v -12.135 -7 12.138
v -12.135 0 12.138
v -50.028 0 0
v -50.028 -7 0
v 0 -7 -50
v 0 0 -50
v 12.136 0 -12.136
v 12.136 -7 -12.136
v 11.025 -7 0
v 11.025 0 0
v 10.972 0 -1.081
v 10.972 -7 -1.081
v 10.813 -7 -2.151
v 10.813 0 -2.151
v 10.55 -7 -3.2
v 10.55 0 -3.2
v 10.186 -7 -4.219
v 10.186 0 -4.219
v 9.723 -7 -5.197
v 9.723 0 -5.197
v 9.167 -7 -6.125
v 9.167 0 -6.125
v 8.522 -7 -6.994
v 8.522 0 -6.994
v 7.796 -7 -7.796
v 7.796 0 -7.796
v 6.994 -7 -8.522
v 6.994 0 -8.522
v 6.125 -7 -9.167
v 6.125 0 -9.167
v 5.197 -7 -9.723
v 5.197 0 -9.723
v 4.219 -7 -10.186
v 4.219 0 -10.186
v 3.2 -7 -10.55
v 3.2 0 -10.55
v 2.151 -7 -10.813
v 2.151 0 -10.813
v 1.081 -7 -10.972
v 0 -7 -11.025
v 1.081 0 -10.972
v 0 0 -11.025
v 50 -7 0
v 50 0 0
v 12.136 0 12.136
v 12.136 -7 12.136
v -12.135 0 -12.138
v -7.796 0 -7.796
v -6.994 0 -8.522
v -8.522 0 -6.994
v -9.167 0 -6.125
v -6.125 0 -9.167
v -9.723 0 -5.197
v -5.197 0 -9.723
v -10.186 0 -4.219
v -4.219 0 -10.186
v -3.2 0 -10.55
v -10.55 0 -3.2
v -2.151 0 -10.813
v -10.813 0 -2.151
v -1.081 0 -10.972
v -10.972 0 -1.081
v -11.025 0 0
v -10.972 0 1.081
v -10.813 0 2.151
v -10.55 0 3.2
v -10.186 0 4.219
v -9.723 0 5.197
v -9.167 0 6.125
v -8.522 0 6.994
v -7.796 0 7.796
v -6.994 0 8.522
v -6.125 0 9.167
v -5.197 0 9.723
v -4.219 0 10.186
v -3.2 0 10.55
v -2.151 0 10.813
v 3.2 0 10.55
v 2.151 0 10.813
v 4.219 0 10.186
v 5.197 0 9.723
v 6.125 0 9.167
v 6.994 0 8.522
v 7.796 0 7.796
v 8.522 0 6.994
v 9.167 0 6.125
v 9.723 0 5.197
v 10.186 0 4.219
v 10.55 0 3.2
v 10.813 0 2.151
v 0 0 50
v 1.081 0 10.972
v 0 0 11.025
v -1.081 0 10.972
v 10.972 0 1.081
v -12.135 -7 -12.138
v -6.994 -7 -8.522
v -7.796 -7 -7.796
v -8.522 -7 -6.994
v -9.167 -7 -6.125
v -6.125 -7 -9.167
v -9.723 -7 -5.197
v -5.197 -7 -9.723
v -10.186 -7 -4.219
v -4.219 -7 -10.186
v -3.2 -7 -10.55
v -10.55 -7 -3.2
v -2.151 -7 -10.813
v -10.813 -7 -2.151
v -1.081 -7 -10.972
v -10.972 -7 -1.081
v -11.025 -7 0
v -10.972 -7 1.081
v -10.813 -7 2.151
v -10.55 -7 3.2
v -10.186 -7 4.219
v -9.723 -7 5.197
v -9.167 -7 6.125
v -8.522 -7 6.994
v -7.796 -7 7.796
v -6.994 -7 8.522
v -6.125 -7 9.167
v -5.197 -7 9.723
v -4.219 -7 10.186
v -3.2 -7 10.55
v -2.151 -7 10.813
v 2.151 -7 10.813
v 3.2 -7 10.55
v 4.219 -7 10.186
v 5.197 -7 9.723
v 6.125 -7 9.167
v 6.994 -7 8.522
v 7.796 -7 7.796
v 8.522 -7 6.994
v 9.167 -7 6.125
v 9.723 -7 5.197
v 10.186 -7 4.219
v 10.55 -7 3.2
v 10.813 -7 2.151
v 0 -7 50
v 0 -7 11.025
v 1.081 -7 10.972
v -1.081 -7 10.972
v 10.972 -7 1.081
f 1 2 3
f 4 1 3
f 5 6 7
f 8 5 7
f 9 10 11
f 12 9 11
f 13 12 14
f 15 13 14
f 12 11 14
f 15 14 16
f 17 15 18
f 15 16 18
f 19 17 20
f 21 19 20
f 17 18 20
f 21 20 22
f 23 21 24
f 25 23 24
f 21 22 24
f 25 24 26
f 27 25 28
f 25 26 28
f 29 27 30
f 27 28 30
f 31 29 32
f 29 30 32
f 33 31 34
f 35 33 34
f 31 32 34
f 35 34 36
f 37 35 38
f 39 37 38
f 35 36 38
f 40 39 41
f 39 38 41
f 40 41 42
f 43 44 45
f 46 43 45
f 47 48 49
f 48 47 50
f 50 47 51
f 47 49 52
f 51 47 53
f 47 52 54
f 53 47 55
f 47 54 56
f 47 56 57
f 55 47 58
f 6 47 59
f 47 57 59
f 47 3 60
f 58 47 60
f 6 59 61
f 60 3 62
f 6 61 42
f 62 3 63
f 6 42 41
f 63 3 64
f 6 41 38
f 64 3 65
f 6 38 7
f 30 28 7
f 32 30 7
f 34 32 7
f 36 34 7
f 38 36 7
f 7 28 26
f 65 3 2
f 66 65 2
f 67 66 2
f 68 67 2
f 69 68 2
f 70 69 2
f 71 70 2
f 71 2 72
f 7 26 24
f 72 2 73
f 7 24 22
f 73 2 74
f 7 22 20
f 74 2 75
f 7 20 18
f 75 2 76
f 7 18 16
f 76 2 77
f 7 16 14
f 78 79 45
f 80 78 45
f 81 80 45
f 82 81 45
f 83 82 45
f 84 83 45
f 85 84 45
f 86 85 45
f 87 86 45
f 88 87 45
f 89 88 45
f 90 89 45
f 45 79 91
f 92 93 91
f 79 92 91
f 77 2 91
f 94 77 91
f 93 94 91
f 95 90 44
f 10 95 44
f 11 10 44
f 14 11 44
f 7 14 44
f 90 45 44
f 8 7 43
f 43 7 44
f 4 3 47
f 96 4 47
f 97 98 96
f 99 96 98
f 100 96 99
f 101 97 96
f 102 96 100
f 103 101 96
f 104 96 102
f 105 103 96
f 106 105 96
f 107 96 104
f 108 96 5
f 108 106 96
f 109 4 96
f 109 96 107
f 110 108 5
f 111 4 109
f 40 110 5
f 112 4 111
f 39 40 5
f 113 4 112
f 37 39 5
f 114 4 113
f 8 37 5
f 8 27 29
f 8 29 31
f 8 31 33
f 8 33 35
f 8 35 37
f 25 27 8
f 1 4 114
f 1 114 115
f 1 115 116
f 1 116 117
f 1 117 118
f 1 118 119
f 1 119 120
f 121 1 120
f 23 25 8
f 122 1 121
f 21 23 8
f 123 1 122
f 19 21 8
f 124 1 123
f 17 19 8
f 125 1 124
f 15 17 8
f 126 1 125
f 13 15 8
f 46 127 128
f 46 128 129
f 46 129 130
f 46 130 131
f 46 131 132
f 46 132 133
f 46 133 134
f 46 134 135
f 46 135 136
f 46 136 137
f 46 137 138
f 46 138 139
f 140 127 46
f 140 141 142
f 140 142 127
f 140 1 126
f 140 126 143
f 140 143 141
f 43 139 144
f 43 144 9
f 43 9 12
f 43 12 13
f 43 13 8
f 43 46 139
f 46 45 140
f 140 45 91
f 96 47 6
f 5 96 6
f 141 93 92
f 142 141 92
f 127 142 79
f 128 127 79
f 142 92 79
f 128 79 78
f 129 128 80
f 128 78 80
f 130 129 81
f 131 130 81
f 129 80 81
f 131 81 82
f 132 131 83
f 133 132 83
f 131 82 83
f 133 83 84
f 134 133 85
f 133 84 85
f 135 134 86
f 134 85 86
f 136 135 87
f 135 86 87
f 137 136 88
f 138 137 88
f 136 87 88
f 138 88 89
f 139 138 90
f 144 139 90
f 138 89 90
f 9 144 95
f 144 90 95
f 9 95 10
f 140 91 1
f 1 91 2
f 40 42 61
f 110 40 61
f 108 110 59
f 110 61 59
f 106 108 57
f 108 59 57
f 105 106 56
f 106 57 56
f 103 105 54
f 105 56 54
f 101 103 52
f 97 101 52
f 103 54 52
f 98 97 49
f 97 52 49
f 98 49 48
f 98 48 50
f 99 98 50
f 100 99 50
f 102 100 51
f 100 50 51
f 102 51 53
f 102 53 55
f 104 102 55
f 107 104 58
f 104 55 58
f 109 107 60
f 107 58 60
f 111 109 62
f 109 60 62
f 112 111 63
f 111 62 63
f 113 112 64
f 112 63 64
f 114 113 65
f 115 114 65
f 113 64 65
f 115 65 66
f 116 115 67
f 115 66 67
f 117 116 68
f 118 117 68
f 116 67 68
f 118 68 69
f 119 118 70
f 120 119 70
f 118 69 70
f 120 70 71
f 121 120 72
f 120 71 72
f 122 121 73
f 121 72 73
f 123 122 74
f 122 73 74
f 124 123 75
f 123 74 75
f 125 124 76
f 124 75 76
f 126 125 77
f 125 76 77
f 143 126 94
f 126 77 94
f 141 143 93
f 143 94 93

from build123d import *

# Parameters (mm, degrees)
F1_DEPTH = 7


with BuildPart() as f1:
    # F0 (on Front) → F1 (new body)
    with BuildSketch(Plane.XZ):
        with BuildLine():
            Line((13.0394884775, 9.315168557), (16.025, 0))
            ThreePointArc((16.025, 0), (15.2603805302, 4.8909519599), (13.0394884775, 9.315168557))
        make_face()
        with BuildLine():
            ThreePointArc((13.0394884775, 9.315168557), (15.2603805302, 4.8909519599), (16.025, 0))
            ThreePointArc((16.025, 0), (15.2603805302, -4.8909519599), (13.0394884775, -9.315168557))
            Line((13.0394884775, -9.315168557), (12.1355547141, -12.1355547141))
            Line((12.1355547141, -12.1355547141), (50, 0))
            Line((50, 0), (12.1355547141, 12.1355547141))
            Line((12.1355547141, 12.1355547141), (13.0394884775, 9.315168557))
        make_face()
        with BuildLine():
            Line((11.025, 0), (16.025, 0))
            Line((16.025, 0), (13.0394884775, 9.315168557))
            ThreePointArc((13.0394884775, 9.315168557), (11.3313861685, 11.3313861685), (9.315168557, 13.0394884775))
            Line((9.315168557, 13.0394884775), (0, 16.025))
            Line((0, 16.025), (0, 11.025))
            ThreePointArc((0, 11.025), (7.7958522626, 7.7958522626), (11.025, 0))
        make_face()
        with BuildLine():
            ThreePointArc((13.0394884775, -9.315168557), (15.2603805302, -4.8909519599), (16.025, 0))
            Line((16.025, 0), (13.0394884775, -9.315168557))
        make_face()
        with BuildLine():
            Line((13.0394884775, -9.315168557), (16.025, 0))
            Line((16.025, 0), (11.025, 0))
            ThreePointArc((11.025, 0), (7.7958522626, -7.7958522626), (0, -11.025))
            Line((0, -11.025), (0, -16.025))
            Line((0, -16.025), (9.315168557, -13.0394884775))
            ThreePointArc((9.315168557, -13.0394884775), (11.3313861685, -11.3313861685), (13.0394884775, -9.315168557))
        make_face()
        with BuildLine():
            ThreePointArc((9.315168557, 13.0394884775), (11.3313861685, 11.3313861685), (13.0394884775, 9.315168557))
            Line((13.0394884775, 9.315168557), (12.1355547141, 12.1355547141))
            Line((12.1355547141, 12.1355547141), (9.315168557, 13.0394884775))
        make_face()
        with BuildLine():
            Line((12.1355547141, -12.1355547141), (13.0394884775, -9.315168557))
            ThreePointArc((13.0394884775, -9.315168557), (11.3313861685, -11.3313861685), (9.315168557, -13.0394884775))
            Line((9.315168557, -13.0394884775), (12.1355547141, -12.1355547141))
        make_face()
        with BuildLine():
            Line((0, 16.025), (9.315168557, 13.0394884775))
            ThreePointArc((9.315168557, 13.0394884775), (4.8909519599, 15.2603805302), (0, 16.025))
        make_face()
        with BuildLine():
            ThreePointArc((0, 16.025), (4.8909519599, 15.2603805302), (9.315168557, 13.0394884775))
            Line((9.315168557, 13.0394884775), (12.1355547141, 12.1355547141))
            Line((12.1355547141, 12.1355547141), (0, 50))
            Line((0, 50), (-12.1347763783, 12.1379832191))
            Line((-12.1347763783, 12.1379832191), (-9.3109210563, 13.0425217686))
            ThreePointArc((-9.3109210563, 13.0425217686), (-4.8884667156, 15.2611768278), (0, 16.025))
        make_face()
        with BuildLine():
            Line((12.1355547141, -12.1355547141), (9.315168557, -13.0394884775))
            ThreePointArc((9.315168557, -13.0394884775), (4.8909519599, -15.2603805302), (0, -16.025))
            ThreePointArc((0, -16.025), (-4.8884667156, -15.2611768278), (-9.3109210563, -13.0425217686))
            Line((-9.3109210563, -13.0425217686), (-12.1347763783, -12.1379832191))
            Line((-12.1347763783, -12.1379832191), (0, -50))
            Line((0, -50), (12.1355547141, -12.1355547141))
        make_face()
        with BuildLine():
            ThreePointArc((0, -16.025), (4.8909519599, -15.2603805302), (9.315168557, -13.0394884775))
            Line((9.315168557, -13.0394884775), (0, -16.025))
        make_face()
        with BuildLine():
            ThreePointArc((0, -11.025), (-11.025, 0), (0, 11.025))
            Line((0, 11.025), (0, 16.025))
            Line((0, 16.025), (-9.3109210563, 13.0425217686))
            ThreePointArc((-9.3109210563, 13.0425217686), (-11.3295406823, 11.3332313542), (-13.0394884775, 9.315168557))
            Line((-13.0394884775, 9.315168557), (-16.025, 0))
            Line((-16.025, 0), (-13.0394884775, -9.315168557))
            ThreePointArc((-13.0394884775, -9.315168557), (-11.3295406823, -11.3332313542), (-9.3109210563, -13.0425217686))
            Line((-9.3109210563, -13.0425217686), (0, -16.025))
            Line((0, -16.025), (0, -11.025))
        make_face()
        with BuildLine():
            Line((-9.3109210563, 13.0425217686), (0, 16.025))
            ThreePointArc((0, 16.025), (-4.8884667156, 15.2611768278), (-9.3109210563, 13.0425217686))
        make_face()
        with BuildLine():
            ThreePointArc((-9.3109210563, -13.0425217686), (-4.8884667156, -15.2611768278), (0, -16.025))
            Line((0, -16.025), (-9.3109210563, -13.0425217686))
        make_face()
        with BuildLine():
            ThreePointArc((-13.0394884775, 9.315168557), (-11.3295406823, 11.3332313542), (-9.3109210563, 13.0425217686))
            Line((-9.3109210563, 13.0425217686), (-12.1347763783, 12.1379832191))
            Line((-12.1347763783, 12.1379832191), (-13.0394884775, 9.315168557))
        make_face()
        with BuildLine():
            Line((-13.0394884775, 9.315168557), (-12.1347763783, 12.1379832191))
            Line((-12.1347763783, 12.1379832191), (-50.0280298293, 0))
            Line((-50.0280298293, 0), (-12.1347763783, -12.1379832191))
            Line((-12.1347763783, -12.1379832191), (-13.0394884775, -9.315168557))
            ThreePointArc((-13.0394884775, -9.315168557), (-15.2603805302, -4.8909519599), (-16.025, 0))
            ThreePointArc((-16.025, 0), (-15.2603805302, 4.8909519599), (-13.0394884775, 9.315168557))
        make_face()
        with BuildLine():
            Line((-12.1347763783, -12.1379832191), (-9.3109210563, -13.0425217686))
            ThreePointArc((-9.3109210563, -13.0425217686), (-11.3295406823, -11.3332313542), (-13.0394884775, -9.315168557))
            Line((-13.0394884775, -9.315168557), (-12.1347763783, -12.1379832191))
        make_face()
        with BuildLine():
            Line((-16.025, 0), (-13.0394884775, 9.315168557))
            ThreePointArc((-13.0394884775, 9.315168557), (-15.2603805302, 4.8909519599), (-16.025, 0))
        make_face()
        with BuildLine():
            ThreePointArc((-16.025, 0), (-15.2603805302, -4.8909519599), (-13.0394884775, -9.315168557))
            Line((-13.0394884775, -9.315168557), (-16.025, 0))
        make_face()
    extrude(amount=F1_DEPTH)


solid = f1.part
